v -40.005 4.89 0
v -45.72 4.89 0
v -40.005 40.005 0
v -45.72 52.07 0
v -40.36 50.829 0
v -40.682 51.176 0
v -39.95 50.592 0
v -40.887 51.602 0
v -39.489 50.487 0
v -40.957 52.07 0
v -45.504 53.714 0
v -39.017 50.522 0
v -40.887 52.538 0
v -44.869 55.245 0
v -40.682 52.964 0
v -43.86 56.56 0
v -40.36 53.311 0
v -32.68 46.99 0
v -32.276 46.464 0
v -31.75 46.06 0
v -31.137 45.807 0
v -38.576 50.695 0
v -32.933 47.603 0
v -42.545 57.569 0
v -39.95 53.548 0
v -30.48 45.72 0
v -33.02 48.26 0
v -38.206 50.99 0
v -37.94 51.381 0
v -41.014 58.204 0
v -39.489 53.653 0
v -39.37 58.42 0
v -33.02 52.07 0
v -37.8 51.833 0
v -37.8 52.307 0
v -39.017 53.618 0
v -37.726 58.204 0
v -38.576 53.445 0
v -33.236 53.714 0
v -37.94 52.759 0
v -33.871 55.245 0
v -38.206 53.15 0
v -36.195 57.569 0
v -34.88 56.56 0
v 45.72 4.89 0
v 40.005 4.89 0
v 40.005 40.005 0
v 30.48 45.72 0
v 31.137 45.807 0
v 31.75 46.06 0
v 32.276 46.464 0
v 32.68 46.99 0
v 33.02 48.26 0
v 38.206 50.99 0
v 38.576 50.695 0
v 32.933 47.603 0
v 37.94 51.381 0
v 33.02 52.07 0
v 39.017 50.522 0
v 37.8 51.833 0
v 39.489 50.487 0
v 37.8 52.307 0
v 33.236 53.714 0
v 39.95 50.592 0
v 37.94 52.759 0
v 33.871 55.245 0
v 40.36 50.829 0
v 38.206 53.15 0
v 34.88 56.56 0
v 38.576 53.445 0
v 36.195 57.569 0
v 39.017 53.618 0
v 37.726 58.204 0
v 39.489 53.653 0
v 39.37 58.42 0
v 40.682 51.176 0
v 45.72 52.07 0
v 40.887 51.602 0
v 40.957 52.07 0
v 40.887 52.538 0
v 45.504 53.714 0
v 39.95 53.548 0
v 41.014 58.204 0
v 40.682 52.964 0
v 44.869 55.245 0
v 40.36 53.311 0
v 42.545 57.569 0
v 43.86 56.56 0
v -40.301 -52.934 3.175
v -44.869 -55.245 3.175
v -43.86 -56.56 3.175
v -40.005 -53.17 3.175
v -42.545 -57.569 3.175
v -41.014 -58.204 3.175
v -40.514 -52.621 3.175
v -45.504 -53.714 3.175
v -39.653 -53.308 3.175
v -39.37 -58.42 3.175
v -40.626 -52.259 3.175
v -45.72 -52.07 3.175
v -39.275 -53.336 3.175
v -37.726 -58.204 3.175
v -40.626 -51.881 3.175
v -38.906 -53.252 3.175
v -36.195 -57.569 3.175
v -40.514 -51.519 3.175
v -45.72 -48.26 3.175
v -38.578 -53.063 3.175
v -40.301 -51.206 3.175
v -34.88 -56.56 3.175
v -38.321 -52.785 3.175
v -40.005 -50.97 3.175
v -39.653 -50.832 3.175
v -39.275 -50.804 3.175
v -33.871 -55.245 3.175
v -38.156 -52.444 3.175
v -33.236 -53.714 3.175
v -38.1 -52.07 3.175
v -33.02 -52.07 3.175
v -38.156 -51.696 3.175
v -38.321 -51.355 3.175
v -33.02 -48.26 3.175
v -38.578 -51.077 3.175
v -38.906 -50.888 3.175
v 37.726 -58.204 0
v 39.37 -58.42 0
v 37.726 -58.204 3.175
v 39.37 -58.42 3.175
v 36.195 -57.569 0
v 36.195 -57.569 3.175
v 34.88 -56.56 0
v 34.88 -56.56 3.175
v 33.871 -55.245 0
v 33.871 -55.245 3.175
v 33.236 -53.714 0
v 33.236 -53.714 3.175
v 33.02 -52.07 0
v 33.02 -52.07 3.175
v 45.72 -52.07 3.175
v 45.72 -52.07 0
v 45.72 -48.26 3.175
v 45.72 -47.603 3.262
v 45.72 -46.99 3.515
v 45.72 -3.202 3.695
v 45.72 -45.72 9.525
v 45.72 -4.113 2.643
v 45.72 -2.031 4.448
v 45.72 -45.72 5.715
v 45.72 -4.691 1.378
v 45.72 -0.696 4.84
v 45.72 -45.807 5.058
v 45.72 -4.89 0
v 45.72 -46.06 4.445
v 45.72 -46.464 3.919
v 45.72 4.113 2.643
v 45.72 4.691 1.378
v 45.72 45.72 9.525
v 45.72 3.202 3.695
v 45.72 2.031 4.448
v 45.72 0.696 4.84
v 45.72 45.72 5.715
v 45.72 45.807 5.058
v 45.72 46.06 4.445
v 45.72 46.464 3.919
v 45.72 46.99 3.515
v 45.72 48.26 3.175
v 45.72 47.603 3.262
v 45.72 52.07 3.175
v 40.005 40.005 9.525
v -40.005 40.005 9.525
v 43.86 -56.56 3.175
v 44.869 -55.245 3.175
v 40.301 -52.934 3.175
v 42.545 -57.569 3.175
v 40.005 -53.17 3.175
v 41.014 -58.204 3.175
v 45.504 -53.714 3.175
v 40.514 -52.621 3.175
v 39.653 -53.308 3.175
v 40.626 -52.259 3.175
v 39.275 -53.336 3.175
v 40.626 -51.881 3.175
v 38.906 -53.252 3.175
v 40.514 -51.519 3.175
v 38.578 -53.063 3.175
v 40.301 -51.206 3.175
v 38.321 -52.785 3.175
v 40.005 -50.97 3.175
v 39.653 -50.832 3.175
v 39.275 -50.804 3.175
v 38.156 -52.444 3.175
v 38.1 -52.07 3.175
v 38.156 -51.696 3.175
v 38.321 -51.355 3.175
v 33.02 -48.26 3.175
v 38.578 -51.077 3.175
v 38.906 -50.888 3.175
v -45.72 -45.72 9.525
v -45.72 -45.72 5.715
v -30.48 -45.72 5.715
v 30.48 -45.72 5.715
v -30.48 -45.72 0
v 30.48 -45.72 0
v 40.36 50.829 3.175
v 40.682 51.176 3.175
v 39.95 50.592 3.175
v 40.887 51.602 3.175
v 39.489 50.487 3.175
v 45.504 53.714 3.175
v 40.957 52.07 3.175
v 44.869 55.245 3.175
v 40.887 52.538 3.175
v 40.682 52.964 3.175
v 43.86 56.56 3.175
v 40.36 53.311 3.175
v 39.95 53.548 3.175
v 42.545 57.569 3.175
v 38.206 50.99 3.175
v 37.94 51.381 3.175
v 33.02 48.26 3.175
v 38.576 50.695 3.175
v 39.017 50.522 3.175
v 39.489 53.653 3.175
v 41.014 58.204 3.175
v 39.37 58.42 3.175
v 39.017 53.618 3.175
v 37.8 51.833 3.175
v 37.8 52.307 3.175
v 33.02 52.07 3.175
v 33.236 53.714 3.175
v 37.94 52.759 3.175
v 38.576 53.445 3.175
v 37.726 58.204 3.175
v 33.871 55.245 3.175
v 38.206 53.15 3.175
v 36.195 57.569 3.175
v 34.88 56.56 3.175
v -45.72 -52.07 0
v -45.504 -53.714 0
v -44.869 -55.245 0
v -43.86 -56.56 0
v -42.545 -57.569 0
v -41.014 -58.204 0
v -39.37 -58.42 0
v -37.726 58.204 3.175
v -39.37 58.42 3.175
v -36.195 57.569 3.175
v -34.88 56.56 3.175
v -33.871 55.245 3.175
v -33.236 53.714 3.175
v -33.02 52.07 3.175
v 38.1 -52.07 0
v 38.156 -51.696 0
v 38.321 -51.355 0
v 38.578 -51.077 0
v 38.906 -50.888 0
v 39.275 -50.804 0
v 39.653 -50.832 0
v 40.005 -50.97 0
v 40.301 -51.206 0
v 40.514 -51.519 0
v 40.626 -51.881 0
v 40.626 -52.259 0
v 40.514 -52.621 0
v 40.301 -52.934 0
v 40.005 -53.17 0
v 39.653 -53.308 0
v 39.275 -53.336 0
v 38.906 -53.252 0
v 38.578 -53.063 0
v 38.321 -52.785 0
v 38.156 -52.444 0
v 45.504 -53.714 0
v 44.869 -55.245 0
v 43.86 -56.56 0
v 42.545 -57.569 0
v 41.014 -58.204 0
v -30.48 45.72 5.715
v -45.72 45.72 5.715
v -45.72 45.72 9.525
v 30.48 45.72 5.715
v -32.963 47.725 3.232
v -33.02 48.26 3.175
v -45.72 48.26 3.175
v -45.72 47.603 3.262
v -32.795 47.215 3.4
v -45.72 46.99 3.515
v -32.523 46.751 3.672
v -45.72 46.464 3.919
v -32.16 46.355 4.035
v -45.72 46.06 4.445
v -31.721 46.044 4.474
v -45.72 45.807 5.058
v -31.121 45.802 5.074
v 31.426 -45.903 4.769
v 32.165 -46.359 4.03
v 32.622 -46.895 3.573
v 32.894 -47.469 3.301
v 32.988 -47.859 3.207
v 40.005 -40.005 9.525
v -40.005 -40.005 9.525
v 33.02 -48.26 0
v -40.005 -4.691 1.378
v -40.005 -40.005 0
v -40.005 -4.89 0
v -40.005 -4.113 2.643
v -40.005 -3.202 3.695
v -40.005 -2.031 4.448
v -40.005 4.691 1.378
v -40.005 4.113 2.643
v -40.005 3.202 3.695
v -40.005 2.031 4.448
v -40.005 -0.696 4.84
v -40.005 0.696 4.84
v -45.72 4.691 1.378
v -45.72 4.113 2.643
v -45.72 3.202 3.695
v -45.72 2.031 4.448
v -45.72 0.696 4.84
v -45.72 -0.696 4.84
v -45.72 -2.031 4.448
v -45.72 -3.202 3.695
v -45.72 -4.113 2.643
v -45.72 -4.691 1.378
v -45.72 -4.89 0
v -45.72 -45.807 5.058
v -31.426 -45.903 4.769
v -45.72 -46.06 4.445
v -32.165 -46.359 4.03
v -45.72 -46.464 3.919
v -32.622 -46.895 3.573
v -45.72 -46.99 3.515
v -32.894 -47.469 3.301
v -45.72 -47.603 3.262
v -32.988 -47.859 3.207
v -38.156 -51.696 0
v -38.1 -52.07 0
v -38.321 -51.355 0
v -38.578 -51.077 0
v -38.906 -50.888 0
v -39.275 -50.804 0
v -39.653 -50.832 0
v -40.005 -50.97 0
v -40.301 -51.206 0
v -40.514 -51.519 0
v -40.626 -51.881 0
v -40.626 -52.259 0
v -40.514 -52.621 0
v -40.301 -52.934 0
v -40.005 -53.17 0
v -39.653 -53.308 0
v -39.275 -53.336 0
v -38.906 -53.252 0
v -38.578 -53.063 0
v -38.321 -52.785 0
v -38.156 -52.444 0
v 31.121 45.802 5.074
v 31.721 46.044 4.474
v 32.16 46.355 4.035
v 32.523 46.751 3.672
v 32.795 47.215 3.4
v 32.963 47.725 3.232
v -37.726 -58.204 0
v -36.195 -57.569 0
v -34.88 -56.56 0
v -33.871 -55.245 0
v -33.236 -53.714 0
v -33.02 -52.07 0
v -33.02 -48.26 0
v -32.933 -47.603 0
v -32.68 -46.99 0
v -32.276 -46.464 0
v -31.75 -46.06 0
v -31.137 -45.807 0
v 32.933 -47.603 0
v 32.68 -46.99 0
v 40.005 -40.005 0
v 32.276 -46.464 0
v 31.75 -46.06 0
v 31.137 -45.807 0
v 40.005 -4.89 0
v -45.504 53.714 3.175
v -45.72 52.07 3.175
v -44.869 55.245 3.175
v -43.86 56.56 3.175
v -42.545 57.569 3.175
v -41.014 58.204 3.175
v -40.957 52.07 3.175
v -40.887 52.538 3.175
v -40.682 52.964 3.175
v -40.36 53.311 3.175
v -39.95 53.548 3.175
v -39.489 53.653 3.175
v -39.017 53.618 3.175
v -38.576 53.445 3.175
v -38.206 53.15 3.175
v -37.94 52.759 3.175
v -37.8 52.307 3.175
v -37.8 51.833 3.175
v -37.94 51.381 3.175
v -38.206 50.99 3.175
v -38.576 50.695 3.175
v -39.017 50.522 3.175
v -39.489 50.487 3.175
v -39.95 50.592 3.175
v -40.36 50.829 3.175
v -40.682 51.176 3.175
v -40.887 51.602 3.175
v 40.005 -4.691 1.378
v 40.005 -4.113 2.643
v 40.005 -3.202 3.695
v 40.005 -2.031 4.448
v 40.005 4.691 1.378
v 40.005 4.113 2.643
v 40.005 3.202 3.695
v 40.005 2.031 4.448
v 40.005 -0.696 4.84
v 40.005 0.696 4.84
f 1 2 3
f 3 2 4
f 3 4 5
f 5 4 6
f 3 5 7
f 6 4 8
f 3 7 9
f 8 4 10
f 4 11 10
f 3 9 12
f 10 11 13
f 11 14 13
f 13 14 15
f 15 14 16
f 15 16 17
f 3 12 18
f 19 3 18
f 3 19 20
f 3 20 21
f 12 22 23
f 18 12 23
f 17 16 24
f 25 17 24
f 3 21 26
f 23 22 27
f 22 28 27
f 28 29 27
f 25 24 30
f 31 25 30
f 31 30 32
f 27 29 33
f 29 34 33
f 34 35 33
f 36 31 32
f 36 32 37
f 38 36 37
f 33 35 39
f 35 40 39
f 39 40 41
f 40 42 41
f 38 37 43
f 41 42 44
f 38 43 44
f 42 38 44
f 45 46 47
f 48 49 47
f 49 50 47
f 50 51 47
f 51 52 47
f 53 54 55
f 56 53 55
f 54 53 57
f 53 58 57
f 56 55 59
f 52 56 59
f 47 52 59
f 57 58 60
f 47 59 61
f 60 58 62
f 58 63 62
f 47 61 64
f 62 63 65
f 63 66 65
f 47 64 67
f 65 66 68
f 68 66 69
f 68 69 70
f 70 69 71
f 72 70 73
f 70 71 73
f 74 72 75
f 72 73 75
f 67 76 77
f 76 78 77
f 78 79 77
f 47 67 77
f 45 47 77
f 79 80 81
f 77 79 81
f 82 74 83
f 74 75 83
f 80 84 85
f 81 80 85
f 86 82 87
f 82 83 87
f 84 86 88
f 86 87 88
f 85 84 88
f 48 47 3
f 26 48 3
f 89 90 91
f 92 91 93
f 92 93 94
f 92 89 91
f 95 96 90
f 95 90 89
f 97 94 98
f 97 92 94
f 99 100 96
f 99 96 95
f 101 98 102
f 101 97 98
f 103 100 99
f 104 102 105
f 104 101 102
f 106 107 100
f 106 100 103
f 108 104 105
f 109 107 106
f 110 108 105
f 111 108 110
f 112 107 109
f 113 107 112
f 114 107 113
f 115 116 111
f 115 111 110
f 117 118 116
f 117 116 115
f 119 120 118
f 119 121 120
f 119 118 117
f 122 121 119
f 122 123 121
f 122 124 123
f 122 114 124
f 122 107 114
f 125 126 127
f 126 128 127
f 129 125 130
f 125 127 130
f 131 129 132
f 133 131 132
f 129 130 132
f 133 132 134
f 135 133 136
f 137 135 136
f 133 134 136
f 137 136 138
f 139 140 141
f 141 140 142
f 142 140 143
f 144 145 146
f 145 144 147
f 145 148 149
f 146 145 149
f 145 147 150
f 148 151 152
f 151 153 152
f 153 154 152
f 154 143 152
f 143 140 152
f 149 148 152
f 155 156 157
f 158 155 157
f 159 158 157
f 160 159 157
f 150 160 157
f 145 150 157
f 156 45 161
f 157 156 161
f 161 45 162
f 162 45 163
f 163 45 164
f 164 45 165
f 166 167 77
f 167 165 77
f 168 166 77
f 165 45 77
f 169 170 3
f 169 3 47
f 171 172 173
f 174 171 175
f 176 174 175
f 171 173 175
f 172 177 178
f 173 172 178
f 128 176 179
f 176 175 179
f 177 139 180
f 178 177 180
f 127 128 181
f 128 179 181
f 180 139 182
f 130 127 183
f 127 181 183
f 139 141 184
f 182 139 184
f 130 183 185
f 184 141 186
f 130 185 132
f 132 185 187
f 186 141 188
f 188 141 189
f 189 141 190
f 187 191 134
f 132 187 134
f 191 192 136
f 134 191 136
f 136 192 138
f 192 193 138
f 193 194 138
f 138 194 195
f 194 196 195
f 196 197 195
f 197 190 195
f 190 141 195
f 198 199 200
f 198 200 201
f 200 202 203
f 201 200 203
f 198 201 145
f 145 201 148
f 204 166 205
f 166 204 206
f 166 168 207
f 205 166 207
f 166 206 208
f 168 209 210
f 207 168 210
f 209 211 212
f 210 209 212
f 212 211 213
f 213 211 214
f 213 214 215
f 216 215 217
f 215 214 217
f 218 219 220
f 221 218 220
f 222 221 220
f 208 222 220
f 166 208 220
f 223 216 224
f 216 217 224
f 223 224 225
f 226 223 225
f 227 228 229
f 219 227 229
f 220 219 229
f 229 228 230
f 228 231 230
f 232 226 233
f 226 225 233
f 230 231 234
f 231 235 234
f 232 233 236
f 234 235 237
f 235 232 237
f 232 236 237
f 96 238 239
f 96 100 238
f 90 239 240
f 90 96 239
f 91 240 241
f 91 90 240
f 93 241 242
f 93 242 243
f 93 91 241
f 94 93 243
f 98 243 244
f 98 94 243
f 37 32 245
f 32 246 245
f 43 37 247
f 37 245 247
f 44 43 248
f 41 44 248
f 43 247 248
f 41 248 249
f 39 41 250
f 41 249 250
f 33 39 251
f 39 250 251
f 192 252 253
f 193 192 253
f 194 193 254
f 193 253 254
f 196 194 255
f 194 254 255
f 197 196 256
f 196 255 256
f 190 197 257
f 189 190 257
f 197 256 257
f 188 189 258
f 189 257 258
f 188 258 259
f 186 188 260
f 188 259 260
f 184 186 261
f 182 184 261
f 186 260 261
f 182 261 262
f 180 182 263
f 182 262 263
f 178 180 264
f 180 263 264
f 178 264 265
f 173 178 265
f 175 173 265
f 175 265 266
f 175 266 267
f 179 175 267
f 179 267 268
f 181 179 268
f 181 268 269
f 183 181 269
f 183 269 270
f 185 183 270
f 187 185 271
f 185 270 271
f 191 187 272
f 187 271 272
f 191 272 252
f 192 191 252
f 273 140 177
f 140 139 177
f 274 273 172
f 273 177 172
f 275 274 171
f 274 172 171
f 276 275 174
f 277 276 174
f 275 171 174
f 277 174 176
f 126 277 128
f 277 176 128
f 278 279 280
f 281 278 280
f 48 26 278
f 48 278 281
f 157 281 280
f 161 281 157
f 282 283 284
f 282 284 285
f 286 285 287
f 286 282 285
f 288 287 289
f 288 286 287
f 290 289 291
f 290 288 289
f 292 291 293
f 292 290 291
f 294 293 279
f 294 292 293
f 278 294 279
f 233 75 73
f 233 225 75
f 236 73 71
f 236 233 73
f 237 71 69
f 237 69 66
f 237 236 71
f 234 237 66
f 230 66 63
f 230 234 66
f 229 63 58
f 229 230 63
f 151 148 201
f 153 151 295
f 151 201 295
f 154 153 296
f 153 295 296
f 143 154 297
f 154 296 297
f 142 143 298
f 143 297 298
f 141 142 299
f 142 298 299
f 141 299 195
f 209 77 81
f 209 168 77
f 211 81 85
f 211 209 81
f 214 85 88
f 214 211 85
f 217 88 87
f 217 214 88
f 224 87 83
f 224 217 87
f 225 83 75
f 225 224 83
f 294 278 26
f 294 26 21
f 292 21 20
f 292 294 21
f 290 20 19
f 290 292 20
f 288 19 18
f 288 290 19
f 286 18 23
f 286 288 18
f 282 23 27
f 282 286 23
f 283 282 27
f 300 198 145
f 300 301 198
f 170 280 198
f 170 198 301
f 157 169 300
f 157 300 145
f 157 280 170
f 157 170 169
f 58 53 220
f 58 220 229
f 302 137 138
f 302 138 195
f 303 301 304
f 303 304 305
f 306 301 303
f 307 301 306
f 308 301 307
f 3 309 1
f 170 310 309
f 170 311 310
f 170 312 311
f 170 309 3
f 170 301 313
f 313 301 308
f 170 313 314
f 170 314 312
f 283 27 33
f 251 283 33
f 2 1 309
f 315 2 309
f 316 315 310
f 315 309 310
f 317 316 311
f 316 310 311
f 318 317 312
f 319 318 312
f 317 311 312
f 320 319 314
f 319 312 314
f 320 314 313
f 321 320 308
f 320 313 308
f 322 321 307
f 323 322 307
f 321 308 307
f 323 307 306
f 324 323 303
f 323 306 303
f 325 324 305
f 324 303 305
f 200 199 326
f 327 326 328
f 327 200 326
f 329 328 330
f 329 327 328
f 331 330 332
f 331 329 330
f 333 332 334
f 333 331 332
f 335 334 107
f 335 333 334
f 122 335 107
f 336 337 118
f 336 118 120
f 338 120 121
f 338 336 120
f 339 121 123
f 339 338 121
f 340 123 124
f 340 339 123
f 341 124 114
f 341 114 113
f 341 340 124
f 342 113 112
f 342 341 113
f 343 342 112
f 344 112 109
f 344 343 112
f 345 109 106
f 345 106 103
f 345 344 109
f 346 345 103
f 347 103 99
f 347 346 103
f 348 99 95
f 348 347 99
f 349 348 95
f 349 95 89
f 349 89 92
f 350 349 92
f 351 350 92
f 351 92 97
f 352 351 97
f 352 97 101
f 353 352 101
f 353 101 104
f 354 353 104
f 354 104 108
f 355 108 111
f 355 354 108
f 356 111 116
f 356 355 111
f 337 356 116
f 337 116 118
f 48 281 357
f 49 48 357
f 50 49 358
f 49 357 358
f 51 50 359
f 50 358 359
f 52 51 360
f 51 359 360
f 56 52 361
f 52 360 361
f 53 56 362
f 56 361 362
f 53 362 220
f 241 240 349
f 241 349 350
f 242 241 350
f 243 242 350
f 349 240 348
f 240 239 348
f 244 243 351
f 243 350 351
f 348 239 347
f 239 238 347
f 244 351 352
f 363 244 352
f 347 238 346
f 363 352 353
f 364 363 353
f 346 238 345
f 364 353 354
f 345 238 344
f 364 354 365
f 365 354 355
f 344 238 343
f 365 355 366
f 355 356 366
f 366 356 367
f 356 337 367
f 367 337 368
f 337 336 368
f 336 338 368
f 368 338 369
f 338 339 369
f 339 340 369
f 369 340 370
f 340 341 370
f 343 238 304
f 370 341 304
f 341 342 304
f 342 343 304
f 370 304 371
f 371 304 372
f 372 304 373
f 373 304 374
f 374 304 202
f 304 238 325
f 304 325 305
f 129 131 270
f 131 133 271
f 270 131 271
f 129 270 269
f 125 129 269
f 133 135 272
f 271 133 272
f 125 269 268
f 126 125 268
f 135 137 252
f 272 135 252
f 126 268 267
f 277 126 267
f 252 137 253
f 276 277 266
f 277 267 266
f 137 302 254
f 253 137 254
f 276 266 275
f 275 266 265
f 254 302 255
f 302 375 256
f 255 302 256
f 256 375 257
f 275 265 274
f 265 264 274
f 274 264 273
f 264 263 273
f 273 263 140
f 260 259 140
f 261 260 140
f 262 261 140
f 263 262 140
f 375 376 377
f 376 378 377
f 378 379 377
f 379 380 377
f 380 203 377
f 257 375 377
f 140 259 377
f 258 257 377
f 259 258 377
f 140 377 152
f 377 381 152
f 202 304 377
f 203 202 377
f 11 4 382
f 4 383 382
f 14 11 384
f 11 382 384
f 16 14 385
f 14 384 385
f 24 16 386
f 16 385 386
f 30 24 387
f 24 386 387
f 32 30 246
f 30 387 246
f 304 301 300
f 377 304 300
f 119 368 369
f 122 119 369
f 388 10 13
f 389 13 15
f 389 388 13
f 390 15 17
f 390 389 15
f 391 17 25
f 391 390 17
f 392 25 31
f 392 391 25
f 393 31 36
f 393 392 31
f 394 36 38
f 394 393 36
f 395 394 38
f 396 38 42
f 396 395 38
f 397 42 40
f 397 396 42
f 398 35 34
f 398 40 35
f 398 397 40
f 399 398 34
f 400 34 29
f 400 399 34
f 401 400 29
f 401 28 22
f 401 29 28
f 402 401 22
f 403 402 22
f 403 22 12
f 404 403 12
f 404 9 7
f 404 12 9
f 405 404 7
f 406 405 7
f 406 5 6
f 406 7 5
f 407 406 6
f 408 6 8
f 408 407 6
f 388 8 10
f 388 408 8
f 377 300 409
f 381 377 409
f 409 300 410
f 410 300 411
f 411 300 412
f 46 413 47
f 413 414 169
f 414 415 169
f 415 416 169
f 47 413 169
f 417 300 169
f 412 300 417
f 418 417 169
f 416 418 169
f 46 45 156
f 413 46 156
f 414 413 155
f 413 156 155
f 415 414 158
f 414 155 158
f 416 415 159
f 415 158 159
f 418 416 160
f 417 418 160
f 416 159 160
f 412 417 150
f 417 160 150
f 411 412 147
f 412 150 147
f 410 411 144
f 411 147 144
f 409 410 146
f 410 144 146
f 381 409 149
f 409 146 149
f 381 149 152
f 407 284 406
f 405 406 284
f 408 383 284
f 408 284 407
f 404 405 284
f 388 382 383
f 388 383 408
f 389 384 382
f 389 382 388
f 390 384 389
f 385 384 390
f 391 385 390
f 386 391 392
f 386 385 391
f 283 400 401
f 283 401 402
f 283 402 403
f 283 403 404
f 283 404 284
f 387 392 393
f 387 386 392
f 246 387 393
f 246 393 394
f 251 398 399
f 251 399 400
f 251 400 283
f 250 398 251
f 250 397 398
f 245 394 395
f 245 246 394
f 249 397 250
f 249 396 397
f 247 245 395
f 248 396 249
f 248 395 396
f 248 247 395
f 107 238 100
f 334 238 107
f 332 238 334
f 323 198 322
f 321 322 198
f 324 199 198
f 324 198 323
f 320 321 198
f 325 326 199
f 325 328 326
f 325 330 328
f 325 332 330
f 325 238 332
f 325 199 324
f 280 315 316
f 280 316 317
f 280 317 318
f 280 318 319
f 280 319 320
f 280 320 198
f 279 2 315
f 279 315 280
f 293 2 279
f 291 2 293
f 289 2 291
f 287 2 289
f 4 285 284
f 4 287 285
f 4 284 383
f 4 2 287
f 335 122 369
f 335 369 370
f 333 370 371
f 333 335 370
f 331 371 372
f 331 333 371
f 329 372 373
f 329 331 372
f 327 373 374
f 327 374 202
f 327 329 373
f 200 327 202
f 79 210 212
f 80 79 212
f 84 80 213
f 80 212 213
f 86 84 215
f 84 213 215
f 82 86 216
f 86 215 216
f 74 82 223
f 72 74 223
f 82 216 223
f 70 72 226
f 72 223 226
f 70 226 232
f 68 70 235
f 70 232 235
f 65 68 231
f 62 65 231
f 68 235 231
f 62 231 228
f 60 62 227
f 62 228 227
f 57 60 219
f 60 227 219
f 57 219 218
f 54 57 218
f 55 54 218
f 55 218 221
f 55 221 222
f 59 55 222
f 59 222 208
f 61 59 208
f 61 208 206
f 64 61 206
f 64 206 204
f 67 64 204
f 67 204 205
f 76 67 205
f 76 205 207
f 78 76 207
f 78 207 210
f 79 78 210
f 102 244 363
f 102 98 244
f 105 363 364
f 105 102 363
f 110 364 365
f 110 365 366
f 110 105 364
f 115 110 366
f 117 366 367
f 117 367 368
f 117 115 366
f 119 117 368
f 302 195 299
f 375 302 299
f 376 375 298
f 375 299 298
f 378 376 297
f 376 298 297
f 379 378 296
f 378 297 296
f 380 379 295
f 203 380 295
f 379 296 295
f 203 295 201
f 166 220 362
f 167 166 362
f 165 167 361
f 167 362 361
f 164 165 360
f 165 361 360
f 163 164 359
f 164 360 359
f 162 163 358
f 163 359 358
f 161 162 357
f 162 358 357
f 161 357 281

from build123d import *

# Parameters (mm, degrees)
SKETCH1_W            = 91.44
SKETCH1_H            = 91.44
BOSS_EXTRUDE1_DEPTH  = 9.525
SKETCH2_W            = 80.01
SKETCH2_H            = 80.01
CUT_EXTRUDE1_DEPTH   = 9.525
SKETCH3_R            = 4.8895
CUT_EXTRUDE2_DEPTH   = 103.675788894
SKETCH4_W            = 12.7
SKETCH4_H            = 12.7
BOSS_EXTRUDE2_DEPTH  = 3.175
SKETCH5_R            = 1.5875
CUT_EXTRUDE3_DEPTH   = 75.454934692
FILLET1_R            = 6.35
FILLET2_R            = 2.54
FILLET1_OF_MIRROR1_R = 6.35
FILLET2_OF_MIRROR1_R = 2.54
SKETCH6_W            = 12.7
SKETCH6_H            = 12.7
SKETCH6_R            = 1.27
BOSS_EXTRUDE3_DEPTH  = 3.175
FILLET3_R            = 2.54
FILLET4_R            = 6.35
FILLET3_OF_MIRROR7_R = 2.54
FILLET4_OF_MIRROR7_R = 6.35


with BuildPart() as part:
    # Sketch1 → Boss-Extrude1 (new body)
    with BuildSketch(Plane.XY):
        Rectangle(SKETCH1_W, SKETCH1_H)
    extrude(amount=BOSS_EXTRUDE1_DEPTH)

    # Sketch2 → Cut-Extrude1 (cut)
    with BuildSketch(Plane.XY.offset(9.525)):
        Rectangle(SKETCH2_W, SKETCH2_H)
    extrude(amount=-CUT_EXTRUDE1_DEPTH, mode=Mode.SUBTRACT)

    # Sketch3 → Cut-Extrude2 (cut, through all)
    with BuildSketch(Plane(origin=(45.72, 0, 0), x_dir=(0, 0, -1), z_dir=(1, 0, 0))):
        Circle(SKETCH3_R)
        with Locations((0, 57.404)):
            Circle(SKETCH3_R)
        with Locations((0, -57.404)):
            Circle(SKETCH3_R)
    extrude(amount=-CUT_EXTRUDE2_DEPTH, mode=Mode.SUBTRACT)

    # Sketch4 → Boss-Extrude2 (add)
    with BuildSketch(Plane(origin=(0, 0, 0), x_dir=(-1, 0, 0), z_dir=(0, 0, -1))):
        with Locations((-39.37, 52.07)):
            Rectangle(SKETCH4_W, SKETCH4_H)
    boss_extrude2 = extrude(amount=-BOSS_EXTRUDE2_DEPTH)

    # Sketch5 → Cut-Extrude3 (cut, through all)
    with BuildSketch(Plane.XY.offset(3.175)):
        with Locations((39.37, 52.07)):
            Circle(SKETCH5_R)
    cut_extrude3 = extrude(amount=-CUT_EXTRUDE3_DEPTH, mode=Mode.SUBTRACT)

    # Fillet1
    fillet1_edges = [part.edges().sort_by_distance(p)[0] for p in [
        (33.02, 58.42, 1.5875),
        (45.72, 58.42, 1.5875),
    ]]
    fillet(fillet1_edges, radius=FILLET1_R - 0.0001)  # a hair under: the kernel refuses the full size

    # Fillet2
    fillet2_edges = [part.edges().sort_by_distance(p)[0] for p in [
        (39.37, 45.72, 3.175),
        (33.02, 45.72, 1.5875),
    ]]
    fillet(fillet2_edges, radius=FILLET2_R)

    # Mirror1: Boss-Extrude2, Cut-Extrude3 across plane
    add(boss_extrude2.mirror(Plane(origin=(0, 0, 0), x_dir=(0, 0, 1), z_dir=(1, 0, 0))))
    add(cut_extrude3.mirror(Plane(origin=(0, 0, 0), x_dir=(0, 0, 1), z_dir=(1, 0, 0))), mode=Mode.SUBTRACT)

    # Fillet1 of Mirror1
    fillet1_of_mirror1_edges = [part.edges().sort_by_distance(p)[0] for p in [
        (-33.02, 58.42, 1.5875),
        (-45.72, 58.42, 1.5875),
    ]]
    fillet(fillet1_of_mirror1_edges, radius=FILLET1_OF_MIRROR1_R - 0.0001)  # a hair under: the kernel refuses the full size

    # Fillet2 of Mirror1
    fillet2_of_mirror1_edges = [part.edges().sort_by_distance(p)[0] for p in [
        (-39.37, 45.72, 3.175),
        (-33.02, 45.72, 1.5875),
    ]]
    fillet(fillet2_of_mirror1_edges, radius=FILLET2_OF_MIRROR1_R)

    # Sketch6 → Boss-Extrude3 (add)
    with BuildSketch(Plane(origin=(0, 0, 0), x_dir=(-1, 0, 0), z_dir=(0, 0, -1))):
        with Locations((-39.37, -52.07)):
            Rectangle(SKETCH6_W, SKETCH6_H)
        with Locations((-39.37, -52.07)):
            Circle(SKETCH6_R, mode=Mode.SUBTRACT)
    boss_extrude3 = extrude(amount=-BOSS_EXTRUDE3_DEPTH)

    # Fillet3
    fillet3_edges = [part.edges().sort_by_distance(p)[0] for p in [
        (39.37, -45.72, 3.175),
        (33.02, -45.72, 1.5875),
    ]]
    fillet(fillet3_edges, radius=FILLET3_R)

    # Fillet4
    fillet4_edges = [part.edges().sort_by_distance(p)[0] for p in [
        (45.72, -58.42, 1.5875),
        (33.02, -58.42, 1.5875),
    ]]
    fillet(fillet4_edges, radius=FILLET4_R - 0.0001)  # a hair under: the kernel refuses the full size

    # Mirror7: Boss-Extrude3 across plane
    add(boss_extrude3.mirror(Plane(origin=(0, 0, 0), x_dir=(0, 0, 1), z_dir=(1, 0, 0))))

    # Fillet3 of Mirror7
    fillet3_of_mirror7_edges = [part.edges().sort_by_distance(p)[0] for p in [
        (-39.37, -45.72, 3.175),
        (-33.02, -45.72, 1.5875),
    ]]
    fillet(fillet3_of_mirror7_edges, radius=FILLET3_OF_MIRROR7_R)

    # Fillet4 of Mirror7
    fillet4_of_mirror7_edges = [part.edges().sort_by_distance(p)[0] for p in [
        (-45.72, -58.42, 1.5875),
        (-33.02, -58.42, 1.5875),
    ]]
    fillet(fillet4_of_mirror7_edges, radius=FILLET4_OF_MIRROR7_R - 0.0001)  # a hair under: the kernel refuses the full size


solid = part.part
